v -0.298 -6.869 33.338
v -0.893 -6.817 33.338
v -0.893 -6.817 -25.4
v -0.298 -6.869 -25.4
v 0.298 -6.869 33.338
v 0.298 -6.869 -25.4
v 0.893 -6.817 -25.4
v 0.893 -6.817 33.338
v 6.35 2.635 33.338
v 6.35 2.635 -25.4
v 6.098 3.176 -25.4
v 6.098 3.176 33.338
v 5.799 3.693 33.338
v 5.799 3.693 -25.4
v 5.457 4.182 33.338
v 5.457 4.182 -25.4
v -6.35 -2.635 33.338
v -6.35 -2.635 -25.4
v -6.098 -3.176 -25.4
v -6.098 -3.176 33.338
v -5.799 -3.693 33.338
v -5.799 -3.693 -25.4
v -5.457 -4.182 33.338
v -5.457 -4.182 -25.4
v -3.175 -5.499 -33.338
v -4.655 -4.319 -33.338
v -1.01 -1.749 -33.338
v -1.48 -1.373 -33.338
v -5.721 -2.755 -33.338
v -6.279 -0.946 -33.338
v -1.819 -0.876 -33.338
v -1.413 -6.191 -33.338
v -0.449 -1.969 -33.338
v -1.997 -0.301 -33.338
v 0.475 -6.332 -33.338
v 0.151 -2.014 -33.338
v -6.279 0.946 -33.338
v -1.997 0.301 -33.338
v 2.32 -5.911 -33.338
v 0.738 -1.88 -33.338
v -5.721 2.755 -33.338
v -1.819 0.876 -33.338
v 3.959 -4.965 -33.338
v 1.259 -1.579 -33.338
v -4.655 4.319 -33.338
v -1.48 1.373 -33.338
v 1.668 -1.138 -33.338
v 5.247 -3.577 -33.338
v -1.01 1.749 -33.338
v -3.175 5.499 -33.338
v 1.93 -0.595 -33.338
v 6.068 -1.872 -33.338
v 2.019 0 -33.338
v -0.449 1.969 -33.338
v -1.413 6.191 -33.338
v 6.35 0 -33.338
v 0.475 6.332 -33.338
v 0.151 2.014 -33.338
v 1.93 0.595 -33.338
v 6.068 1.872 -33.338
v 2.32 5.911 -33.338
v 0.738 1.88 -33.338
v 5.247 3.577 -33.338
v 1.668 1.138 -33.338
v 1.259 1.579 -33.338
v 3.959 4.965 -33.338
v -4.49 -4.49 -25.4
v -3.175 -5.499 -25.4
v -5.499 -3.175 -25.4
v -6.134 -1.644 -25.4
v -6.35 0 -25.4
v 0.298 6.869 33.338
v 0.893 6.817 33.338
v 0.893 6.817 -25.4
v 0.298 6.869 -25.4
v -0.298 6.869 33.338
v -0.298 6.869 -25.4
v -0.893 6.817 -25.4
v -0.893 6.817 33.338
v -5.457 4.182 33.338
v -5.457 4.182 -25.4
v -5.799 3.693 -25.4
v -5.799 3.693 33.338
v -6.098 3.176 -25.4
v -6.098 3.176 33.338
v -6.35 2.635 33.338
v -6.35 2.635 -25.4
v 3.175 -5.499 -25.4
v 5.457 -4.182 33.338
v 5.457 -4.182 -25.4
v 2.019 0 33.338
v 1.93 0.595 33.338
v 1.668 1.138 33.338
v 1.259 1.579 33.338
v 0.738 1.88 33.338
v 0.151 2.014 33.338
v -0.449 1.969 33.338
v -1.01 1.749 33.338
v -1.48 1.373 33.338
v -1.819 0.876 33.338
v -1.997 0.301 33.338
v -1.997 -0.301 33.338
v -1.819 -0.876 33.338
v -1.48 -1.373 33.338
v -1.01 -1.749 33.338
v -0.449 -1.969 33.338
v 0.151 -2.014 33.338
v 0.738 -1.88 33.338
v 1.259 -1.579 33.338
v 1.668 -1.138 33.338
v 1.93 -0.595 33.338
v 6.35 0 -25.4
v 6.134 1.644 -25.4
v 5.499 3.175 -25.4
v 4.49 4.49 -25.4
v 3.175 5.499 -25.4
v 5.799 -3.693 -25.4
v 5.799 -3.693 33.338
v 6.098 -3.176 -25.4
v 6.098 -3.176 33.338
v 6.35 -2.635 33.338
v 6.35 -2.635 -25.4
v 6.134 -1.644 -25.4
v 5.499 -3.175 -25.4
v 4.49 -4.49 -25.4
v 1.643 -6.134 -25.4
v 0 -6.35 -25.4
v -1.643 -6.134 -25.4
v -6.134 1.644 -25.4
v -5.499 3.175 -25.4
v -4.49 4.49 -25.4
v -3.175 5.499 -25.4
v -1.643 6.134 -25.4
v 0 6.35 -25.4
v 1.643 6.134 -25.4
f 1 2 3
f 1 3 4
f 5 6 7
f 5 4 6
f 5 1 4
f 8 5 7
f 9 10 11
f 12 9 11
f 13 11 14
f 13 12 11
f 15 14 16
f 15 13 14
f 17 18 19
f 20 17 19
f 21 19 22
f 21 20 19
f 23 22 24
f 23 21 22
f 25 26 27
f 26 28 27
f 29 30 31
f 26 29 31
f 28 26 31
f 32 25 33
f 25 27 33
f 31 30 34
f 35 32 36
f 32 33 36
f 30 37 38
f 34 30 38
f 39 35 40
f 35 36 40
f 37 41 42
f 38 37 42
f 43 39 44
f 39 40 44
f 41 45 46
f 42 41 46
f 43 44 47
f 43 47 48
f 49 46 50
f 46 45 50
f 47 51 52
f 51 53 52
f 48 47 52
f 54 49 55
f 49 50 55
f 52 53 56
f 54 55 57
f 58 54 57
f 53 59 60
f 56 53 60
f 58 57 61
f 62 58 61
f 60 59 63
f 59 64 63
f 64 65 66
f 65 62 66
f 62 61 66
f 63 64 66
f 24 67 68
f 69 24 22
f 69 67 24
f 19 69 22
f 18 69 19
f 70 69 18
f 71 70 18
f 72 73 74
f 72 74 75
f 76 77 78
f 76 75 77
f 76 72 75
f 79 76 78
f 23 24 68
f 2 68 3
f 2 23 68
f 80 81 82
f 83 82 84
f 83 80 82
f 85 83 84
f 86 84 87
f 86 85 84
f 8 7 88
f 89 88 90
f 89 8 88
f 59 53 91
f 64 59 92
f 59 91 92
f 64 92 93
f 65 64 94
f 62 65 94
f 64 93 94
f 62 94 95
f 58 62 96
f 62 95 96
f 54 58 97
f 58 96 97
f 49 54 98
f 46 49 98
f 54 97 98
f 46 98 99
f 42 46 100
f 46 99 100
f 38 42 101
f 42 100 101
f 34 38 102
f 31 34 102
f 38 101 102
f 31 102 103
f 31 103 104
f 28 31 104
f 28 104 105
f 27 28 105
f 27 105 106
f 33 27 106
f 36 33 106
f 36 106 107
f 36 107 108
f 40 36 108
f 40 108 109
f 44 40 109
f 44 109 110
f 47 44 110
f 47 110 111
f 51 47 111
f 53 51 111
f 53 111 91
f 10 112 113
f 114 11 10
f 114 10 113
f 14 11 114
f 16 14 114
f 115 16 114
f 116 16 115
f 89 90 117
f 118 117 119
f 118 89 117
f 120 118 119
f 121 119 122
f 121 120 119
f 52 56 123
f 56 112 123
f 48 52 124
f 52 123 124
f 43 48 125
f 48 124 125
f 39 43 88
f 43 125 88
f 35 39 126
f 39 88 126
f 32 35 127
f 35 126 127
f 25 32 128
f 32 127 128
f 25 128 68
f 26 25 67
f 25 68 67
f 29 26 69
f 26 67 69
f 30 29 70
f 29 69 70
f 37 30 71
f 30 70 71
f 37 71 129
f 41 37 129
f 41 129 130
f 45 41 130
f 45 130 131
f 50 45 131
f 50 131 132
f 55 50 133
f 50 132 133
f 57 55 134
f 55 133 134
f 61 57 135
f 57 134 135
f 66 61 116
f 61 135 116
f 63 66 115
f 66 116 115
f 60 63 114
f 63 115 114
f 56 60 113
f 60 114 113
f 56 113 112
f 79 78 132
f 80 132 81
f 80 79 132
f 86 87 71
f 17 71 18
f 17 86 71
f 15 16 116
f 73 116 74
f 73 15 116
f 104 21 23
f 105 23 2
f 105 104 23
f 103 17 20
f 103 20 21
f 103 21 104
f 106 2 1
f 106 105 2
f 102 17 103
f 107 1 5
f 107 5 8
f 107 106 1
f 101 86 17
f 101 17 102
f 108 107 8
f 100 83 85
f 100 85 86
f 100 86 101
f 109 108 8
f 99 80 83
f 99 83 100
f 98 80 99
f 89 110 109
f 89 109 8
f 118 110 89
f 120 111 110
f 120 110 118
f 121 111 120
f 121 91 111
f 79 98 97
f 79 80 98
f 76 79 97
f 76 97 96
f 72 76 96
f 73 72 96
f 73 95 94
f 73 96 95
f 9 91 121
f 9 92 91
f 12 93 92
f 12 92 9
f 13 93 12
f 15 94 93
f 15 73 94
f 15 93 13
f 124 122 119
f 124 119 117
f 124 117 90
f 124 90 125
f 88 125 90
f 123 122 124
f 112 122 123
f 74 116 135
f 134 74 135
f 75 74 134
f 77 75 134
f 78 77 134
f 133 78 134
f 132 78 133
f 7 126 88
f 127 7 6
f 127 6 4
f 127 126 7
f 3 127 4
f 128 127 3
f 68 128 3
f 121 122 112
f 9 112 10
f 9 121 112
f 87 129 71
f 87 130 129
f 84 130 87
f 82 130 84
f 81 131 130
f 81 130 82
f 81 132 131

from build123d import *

# Parameters (mm, degrees)
BOSS_EXTRUDE1_DEPTH                  = 33.3375
SKETCH3_R                            = 2.0193
CUT_EXTRUDE1_DEPTH                   = 68.328625042
CUT_EXTRUDE3_START                   = -7.9375
SKETCH8_R                            = 6.875
SKETCH8_R_2                          = 6.35
CUT_EXTRUDE3_DEPTH                   = 7.9375
F_10_32_TAPPED_HOLE1_D               = 4.0386
F_10_32_TAPPED_HOLE1_DEPTH           = 12.02944
F_10_32_TAPPED_HOLE1_TIP             = 1.213317848
F_10_32_TAPPED_HOLE1_ON_FACE_2_D     = 4.0386
F_10_32_TAPPED_HOLE1_ON_FACE_2_DEPTH = 12.02944
F_10_32_TAPPED_HOLE1_ON_FACE_2_TIP   = 1.213317848


with BuildPart() as part:
    # Sketch1 → Boss-Extrude1 (new, symmetric)
    with BuildSketch(Plane.XY):
        with BuildLine():
            Line((-0.893039494, 6.816751826), (-5.456960506, 4.181770802))
            ThreePointArc((-5.456960506, 4.181770802), (-5.953924651, 3.4375), (-6.35, 2.634981025))
            Line((-6.35, 2.634981025), (-6.35, -2.634981025))
            ThreePointArc((-6.35, -2.634981025), (-5.953924651, -3.4375), (-5.456960506, -4.181770802))
            Line((-5.456960506, -4.181770802), (-0.893039494, -6.816751826))
            ThreePointArc((-0.893039494, -6.816751826), (0, -6.875), (0.893039494, -6.816751826))
            Line((0.893039494, -6.816751826), (5.456960506, -4.181770802))
            ThreePointArc((5.456960506, -4.181770802), (5.953924651, -3.4375), (6.35, -2.634981025))
            Line((6.35, -2.634981025), (6.35, 2.634981025))
            ThreePointArc((6.35, 2.634981025), (5.953924651, 3.4375), (5.456960506, 4.181770802))
            Line((5.456960506, 4.181770802), (0.893039494, 6.816751826))
            ThreePointArc((0.893039494, 6.816751826), (0, 6.875), (-0.893039494, 6.816751826))
        make_face()
    extrude(amount=BOSS_EXTRUDE1_DEPTH, both=True)

    # Sketch3 → Cut-Extrude1 (cut, through all)
    with BuildSketch(Plane.XY.offset(33.3375)):
        Circle(SKETCH3_R)
    extrude(amount=-CUT_EXTRUDE1_DEPTH, mode=Mode.SUBTRACT)

    # Sketch8 → Cut-Extrude3 (cut)
    with BuildSketch(Plane(origin=(0, 0, -33.3375), x_dir=(-1, 0, 0), z_dir=(0, 0, -1)).offset(CUT_EXTRUDE3_START)):
        Circle(SKETCH8_R)
        with Locations(Location((0, 0, 0), (0, 0, 180))):
            Circle(SKETCH8_R_2, mode=Mode.SUBTRACT)
    extrude(amount=CUT_EXTRUDE3_DEPTH, mode=Mode.SUBTRACT)

    # #10-32 Tapped Hole1
    with Locations(Plane(origin=(0, 0, -33.3375), x_dir=(-1, 0, 0), z_dir=(0, 0, -1))):
        with Locations((0, 0)):
            Hole(F_10_32_TAPPED_HOLE1_D / 2, depth=F_10_32_TAPPED_HOLE1_DEPTH)
            with Locations((0, 0, -(F_10_32_TAPPED_HOLE1_DEPTH + F_10_32_TAPPED_HOLE1_TIP / 2))):  # 118° drill point
                Cone(0, F_10_32_TAPPED_HOLE1_D / 2, F_10_32_TAPPED_HOLE1_TIP, mode=Mode.SUBTRACT)

    # #10-32 Tapped Hole1 on face 2
    with Locations(Plane(origin=(0, 0, 33.3375), x_dir=(-1, 0, 0), z_dir=(0, 0, -1))):
        with Locations((0, 0)):
            Hole(F_10_32_TAPPED_HOLE1_ON_FACE_2_D / 2, depth=F_10_32_TAPPED_HOLE1_ON_FACE_2_DEPTH)
            with Locations((0, 0, -(F_10_32_TAPPED_HOLE1_ON_FACE_2_DEPTH + F_10_32_TAPPED_HOLE1_ON_FACE_2_TIP / 2))):  # 118° drill point
                Cone(0, F_10_32_TAPPED_HOLE1_ON_FACE_2_D / 2, F_10_32_TAPPED_HOLE1_ON_FACE_2_TIP, mode=Mode.SUBTRACT)


solid = part.part
